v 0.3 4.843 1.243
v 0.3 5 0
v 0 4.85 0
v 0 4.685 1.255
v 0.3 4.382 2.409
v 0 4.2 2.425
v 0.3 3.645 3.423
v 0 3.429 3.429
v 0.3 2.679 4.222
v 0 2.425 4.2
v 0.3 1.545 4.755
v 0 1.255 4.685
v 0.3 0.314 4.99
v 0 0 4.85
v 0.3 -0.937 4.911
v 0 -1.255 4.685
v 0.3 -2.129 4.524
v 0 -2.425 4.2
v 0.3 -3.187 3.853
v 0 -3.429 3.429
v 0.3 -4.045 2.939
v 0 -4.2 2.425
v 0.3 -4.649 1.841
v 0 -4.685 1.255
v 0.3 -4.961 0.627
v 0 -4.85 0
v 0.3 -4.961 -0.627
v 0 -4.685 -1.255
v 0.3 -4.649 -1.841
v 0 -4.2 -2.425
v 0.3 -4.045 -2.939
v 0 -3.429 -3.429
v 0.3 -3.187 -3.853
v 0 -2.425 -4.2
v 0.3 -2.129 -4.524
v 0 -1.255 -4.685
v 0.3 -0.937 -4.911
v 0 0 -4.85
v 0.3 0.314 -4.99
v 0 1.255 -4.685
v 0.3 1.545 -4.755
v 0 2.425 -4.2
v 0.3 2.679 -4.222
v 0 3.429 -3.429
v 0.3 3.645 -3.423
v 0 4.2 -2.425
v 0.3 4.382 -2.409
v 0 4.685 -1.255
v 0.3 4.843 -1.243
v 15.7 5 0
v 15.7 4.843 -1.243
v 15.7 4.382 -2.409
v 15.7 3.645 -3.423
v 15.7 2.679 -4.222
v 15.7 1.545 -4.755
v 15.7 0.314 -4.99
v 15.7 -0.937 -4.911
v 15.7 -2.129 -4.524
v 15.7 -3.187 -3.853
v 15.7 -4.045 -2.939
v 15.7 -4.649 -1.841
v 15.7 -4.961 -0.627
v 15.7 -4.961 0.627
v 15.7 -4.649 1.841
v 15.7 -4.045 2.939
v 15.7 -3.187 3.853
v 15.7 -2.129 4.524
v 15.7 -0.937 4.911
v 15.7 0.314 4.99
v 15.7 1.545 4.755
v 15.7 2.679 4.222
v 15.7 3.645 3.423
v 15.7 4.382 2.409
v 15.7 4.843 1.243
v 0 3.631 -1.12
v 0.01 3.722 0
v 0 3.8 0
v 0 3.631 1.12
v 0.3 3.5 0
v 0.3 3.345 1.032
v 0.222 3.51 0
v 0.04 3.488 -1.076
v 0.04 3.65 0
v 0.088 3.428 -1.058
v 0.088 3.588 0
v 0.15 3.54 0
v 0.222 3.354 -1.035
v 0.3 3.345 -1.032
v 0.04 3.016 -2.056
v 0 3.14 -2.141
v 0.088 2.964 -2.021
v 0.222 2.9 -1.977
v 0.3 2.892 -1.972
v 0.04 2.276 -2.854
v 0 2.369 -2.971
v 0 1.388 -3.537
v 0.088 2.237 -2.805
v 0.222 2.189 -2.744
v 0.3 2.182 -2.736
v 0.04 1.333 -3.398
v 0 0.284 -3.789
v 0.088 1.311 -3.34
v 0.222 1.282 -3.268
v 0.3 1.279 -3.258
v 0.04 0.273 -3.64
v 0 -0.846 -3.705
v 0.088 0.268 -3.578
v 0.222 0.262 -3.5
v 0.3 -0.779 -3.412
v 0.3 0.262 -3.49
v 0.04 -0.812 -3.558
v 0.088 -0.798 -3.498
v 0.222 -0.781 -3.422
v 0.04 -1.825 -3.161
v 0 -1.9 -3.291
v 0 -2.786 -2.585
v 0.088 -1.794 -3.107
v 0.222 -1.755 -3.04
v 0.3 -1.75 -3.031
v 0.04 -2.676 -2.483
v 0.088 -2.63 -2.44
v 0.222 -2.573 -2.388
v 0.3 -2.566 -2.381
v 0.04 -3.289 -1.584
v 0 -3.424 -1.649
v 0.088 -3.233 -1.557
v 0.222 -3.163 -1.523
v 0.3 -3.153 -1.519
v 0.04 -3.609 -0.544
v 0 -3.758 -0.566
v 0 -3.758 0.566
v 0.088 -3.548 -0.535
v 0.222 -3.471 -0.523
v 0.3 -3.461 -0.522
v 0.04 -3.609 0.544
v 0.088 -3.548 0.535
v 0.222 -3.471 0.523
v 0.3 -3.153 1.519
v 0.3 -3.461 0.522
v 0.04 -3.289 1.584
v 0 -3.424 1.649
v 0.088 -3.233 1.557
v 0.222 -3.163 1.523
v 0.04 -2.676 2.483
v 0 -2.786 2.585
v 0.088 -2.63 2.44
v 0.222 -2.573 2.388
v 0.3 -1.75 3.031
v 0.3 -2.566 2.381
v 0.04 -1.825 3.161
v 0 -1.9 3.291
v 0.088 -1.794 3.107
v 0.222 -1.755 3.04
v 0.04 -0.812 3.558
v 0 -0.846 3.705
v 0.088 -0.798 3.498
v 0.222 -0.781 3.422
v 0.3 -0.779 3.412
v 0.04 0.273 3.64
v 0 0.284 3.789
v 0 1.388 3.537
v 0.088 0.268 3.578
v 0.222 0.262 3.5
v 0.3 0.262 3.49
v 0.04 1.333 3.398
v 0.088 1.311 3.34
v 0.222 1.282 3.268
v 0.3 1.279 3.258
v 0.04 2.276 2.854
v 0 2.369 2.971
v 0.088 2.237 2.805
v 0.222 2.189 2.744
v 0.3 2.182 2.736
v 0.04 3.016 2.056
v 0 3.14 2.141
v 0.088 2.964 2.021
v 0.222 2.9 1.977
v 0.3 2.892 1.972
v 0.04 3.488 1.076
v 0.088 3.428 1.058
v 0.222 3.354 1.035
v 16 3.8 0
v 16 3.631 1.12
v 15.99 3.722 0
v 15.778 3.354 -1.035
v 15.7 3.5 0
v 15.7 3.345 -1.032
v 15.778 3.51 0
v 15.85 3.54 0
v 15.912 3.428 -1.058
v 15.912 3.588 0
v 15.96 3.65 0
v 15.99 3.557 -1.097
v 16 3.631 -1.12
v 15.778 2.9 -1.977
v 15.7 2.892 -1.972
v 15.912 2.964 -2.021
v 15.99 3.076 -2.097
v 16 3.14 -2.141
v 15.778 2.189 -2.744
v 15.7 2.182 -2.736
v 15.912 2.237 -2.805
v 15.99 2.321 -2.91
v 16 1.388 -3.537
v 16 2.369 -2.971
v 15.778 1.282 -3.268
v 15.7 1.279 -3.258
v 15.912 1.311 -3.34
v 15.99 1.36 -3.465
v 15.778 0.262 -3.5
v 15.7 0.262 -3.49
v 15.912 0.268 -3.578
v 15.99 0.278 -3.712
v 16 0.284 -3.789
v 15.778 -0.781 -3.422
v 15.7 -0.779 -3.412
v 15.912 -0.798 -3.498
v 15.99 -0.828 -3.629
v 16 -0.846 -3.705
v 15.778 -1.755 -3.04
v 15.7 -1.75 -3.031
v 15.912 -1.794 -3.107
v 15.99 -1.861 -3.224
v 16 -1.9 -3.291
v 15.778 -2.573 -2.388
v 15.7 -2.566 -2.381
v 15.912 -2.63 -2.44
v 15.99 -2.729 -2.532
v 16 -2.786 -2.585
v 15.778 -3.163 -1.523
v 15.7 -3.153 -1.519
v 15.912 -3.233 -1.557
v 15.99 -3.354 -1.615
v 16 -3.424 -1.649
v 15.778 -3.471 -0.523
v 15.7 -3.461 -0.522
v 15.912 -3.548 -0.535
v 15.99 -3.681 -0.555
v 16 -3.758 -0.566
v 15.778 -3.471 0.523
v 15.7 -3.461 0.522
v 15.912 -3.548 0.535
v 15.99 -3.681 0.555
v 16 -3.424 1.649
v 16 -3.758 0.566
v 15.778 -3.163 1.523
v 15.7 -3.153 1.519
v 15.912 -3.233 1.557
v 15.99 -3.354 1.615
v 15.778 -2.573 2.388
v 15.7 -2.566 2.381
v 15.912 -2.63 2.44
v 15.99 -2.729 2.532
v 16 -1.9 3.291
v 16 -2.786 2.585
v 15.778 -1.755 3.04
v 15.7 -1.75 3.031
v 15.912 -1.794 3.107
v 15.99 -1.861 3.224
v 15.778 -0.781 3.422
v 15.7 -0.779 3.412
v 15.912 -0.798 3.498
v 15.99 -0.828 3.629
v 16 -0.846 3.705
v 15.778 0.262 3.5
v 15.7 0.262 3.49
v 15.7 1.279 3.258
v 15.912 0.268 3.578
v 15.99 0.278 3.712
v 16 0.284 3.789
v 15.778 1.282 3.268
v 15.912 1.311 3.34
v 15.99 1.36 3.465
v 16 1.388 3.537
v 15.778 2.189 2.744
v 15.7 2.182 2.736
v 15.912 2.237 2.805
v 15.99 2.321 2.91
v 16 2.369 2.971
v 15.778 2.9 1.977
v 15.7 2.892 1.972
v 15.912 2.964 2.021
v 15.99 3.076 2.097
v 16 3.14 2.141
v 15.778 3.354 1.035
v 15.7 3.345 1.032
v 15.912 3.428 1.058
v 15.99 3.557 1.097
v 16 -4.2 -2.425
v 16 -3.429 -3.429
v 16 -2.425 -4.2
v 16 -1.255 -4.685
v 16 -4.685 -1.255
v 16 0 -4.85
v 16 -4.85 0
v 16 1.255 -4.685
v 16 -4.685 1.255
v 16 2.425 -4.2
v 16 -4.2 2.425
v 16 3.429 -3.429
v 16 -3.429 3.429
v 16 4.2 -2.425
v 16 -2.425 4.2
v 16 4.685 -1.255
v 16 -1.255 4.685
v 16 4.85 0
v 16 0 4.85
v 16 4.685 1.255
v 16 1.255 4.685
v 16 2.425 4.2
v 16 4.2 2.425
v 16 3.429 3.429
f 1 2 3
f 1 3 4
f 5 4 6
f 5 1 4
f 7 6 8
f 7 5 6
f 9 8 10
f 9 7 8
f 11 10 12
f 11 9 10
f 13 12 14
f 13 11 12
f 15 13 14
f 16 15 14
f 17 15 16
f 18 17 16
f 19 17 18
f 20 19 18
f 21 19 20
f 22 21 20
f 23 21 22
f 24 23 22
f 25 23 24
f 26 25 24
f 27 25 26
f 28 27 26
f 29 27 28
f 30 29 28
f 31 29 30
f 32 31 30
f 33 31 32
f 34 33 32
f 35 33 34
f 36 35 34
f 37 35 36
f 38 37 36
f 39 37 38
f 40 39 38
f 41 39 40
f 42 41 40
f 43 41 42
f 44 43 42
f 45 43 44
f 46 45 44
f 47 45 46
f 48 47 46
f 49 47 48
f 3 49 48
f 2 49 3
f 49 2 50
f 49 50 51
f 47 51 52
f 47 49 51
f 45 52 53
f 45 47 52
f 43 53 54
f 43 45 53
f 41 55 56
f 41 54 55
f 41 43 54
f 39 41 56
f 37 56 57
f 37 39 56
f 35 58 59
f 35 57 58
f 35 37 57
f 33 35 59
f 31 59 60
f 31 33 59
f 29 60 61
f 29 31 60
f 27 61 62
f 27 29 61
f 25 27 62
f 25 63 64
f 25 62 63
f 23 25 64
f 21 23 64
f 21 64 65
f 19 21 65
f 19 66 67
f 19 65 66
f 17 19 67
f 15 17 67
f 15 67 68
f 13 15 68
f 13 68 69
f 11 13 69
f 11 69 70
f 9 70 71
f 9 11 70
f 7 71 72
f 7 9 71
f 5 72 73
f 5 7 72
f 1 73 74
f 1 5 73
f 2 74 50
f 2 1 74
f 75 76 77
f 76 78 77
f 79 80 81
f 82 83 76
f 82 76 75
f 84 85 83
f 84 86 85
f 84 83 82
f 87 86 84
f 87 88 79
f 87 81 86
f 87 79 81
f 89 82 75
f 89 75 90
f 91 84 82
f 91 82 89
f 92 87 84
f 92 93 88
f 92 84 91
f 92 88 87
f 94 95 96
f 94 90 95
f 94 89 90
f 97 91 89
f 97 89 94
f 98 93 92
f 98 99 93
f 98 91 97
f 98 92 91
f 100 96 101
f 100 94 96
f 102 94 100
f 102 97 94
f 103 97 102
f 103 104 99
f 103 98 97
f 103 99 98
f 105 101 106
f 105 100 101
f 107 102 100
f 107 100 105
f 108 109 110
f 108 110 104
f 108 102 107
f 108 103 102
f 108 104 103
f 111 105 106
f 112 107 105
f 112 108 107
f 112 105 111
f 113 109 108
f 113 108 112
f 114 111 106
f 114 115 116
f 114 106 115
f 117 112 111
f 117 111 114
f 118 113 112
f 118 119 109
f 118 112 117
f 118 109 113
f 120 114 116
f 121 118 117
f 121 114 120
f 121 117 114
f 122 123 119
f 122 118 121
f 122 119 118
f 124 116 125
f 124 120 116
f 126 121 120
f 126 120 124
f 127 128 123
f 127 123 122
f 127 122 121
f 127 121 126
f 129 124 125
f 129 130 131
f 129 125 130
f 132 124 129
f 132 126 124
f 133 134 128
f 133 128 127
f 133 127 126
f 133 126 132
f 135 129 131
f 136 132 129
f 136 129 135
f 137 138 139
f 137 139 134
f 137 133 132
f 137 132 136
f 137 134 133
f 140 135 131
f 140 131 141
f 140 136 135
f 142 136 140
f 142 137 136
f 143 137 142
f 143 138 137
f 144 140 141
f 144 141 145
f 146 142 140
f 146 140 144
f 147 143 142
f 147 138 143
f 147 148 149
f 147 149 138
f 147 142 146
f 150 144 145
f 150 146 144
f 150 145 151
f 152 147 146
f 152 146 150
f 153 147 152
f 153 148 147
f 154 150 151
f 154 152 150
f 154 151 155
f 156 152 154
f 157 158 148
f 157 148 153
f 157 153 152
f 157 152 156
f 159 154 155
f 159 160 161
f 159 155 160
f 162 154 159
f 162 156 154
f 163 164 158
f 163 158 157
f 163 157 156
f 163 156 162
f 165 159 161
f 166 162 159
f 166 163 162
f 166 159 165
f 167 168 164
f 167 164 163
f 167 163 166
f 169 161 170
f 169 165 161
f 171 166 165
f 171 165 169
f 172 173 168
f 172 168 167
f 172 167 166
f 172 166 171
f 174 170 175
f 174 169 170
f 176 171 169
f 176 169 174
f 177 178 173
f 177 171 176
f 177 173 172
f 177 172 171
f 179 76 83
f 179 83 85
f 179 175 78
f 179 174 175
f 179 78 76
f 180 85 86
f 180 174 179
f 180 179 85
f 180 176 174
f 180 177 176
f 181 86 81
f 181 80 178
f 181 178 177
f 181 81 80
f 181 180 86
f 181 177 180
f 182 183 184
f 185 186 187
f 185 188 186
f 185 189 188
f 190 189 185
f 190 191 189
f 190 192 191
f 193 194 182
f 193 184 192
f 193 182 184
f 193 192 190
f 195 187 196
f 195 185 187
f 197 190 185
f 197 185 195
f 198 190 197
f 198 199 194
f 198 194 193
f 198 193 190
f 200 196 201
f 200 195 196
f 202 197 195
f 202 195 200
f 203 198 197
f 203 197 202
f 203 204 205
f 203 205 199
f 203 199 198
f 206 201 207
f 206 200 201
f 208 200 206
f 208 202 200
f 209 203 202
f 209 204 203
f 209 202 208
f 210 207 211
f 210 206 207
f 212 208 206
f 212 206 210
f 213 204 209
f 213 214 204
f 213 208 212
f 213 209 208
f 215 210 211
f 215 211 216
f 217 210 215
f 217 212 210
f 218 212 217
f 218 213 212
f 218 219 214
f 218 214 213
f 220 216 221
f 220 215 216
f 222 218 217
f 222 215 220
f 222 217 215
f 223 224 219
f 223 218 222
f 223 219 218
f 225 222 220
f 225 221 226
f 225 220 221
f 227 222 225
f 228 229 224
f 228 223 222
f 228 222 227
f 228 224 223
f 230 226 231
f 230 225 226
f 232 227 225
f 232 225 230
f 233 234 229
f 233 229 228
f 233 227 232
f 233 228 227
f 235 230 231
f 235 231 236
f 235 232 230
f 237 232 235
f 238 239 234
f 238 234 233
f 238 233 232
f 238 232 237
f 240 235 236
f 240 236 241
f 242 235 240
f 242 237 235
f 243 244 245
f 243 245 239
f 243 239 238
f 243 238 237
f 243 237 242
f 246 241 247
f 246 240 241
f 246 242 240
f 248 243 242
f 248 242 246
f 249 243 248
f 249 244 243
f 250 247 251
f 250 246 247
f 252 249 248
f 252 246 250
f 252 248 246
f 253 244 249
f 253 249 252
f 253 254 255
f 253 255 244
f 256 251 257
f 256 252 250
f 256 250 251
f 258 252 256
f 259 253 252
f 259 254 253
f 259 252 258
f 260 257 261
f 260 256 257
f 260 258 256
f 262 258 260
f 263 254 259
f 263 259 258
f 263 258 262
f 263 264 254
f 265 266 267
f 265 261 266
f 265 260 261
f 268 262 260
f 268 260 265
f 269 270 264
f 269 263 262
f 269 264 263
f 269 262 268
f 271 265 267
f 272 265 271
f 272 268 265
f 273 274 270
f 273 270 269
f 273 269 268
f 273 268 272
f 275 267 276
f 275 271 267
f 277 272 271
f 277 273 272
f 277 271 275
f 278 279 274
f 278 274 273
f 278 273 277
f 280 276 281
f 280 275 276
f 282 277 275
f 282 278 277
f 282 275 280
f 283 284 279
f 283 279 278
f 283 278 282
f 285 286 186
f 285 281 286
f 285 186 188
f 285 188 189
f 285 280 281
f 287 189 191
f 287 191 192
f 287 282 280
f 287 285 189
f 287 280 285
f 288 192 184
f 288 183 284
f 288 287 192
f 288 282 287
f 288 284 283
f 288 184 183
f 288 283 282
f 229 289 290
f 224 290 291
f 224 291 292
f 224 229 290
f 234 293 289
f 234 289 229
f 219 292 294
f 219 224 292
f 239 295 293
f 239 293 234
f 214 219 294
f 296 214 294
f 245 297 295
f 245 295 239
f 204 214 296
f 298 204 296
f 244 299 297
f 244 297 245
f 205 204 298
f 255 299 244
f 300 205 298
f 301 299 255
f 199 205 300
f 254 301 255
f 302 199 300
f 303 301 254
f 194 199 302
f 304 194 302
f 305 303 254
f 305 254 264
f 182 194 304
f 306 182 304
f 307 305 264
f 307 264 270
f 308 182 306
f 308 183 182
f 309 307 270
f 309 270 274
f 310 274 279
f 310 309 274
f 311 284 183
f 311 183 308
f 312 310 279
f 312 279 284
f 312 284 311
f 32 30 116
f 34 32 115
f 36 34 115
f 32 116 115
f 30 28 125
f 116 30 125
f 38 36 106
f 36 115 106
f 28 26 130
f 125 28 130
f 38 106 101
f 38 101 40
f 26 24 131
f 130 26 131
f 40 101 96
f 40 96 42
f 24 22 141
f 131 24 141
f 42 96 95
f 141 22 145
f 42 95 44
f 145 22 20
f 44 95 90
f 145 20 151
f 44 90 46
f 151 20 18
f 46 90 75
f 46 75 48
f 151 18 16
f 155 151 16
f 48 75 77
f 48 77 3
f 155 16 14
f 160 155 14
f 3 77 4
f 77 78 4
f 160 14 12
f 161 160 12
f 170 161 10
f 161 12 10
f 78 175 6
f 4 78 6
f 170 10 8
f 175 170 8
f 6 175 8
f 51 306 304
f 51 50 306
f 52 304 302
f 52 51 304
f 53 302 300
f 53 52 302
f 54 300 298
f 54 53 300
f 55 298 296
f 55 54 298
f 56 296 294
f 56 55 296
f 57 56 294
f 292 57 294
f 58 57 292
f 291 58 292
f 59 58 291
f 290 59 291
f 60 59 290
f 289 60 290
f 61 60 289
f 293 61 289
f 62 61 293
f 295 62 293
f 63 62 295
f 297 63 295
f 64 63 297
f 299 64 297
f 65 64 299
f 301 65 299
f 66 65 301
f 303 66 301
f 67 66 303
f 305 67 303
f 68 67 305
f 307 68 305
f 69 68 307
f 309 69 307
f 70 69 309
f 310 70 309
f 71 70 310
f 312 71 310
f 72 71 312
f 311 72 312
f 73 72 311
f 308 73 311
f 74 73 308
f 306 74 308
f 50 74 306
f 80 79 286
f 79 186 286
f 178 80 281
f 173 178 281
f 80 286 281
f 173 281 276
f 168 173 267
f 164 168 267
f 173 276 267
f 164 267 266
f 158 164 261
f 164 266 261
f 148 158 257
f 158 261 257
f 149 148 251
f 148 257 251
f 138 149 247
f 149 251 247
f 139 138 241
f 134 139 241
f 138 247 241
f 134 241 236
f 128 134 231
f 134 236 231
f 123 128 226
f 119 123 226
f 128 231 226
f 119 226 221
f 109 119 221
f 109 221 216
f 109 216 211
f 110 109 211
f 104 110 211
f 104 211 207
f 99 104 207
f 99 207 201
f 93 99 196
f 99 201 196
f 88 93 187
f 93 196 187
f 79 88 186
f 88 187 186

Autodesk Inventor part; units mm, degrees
ref_plane "YZ Plane" through (0, 0, 0) normal (1, 0, 0) x (0, 1, 0)
ref_plane "XZ Plane" through (0, 0, 0) normal (0, 1, 0) x (-1, 0, 0)
ref_plane "XY Plane" through (0, 0, 0) normal (0, 0, 1) x (1, 0, 0)
sketch "Sketch_1" plane through (0, 0, 0) normal (0, 0, 1) x (1, 0, 0)
  line L0 (50, 0) -> (-50, 0)
  line L1 (0, 4.85) -> (0, 3.8)
  arc A0 (0, 3.8) -> (0.3, 3.5) centre (0.3, 3.8) ccw
  line L2 (0.3, 3.5) -> (15.7, 3.5)
  arc A1 (15.7, 3.5) -> (16, 3.8) centre (15.7, 3.8) ccw
  line L3 (16, 3.8) -> (16, 4.85)
  line L4 (16, 4.85) -> (15.7, 5)
  line L5 (15.7, 5) -> (0.3, 5)
  line L6 (0.3, 5) -> (0, 4.85)
revolve "Revolution1" add sketch "Sketch_1" angle 360 about axis through (50, 0, 0) along (1, 0, 0)
properties part number "SKF_IR 7X10X16"
